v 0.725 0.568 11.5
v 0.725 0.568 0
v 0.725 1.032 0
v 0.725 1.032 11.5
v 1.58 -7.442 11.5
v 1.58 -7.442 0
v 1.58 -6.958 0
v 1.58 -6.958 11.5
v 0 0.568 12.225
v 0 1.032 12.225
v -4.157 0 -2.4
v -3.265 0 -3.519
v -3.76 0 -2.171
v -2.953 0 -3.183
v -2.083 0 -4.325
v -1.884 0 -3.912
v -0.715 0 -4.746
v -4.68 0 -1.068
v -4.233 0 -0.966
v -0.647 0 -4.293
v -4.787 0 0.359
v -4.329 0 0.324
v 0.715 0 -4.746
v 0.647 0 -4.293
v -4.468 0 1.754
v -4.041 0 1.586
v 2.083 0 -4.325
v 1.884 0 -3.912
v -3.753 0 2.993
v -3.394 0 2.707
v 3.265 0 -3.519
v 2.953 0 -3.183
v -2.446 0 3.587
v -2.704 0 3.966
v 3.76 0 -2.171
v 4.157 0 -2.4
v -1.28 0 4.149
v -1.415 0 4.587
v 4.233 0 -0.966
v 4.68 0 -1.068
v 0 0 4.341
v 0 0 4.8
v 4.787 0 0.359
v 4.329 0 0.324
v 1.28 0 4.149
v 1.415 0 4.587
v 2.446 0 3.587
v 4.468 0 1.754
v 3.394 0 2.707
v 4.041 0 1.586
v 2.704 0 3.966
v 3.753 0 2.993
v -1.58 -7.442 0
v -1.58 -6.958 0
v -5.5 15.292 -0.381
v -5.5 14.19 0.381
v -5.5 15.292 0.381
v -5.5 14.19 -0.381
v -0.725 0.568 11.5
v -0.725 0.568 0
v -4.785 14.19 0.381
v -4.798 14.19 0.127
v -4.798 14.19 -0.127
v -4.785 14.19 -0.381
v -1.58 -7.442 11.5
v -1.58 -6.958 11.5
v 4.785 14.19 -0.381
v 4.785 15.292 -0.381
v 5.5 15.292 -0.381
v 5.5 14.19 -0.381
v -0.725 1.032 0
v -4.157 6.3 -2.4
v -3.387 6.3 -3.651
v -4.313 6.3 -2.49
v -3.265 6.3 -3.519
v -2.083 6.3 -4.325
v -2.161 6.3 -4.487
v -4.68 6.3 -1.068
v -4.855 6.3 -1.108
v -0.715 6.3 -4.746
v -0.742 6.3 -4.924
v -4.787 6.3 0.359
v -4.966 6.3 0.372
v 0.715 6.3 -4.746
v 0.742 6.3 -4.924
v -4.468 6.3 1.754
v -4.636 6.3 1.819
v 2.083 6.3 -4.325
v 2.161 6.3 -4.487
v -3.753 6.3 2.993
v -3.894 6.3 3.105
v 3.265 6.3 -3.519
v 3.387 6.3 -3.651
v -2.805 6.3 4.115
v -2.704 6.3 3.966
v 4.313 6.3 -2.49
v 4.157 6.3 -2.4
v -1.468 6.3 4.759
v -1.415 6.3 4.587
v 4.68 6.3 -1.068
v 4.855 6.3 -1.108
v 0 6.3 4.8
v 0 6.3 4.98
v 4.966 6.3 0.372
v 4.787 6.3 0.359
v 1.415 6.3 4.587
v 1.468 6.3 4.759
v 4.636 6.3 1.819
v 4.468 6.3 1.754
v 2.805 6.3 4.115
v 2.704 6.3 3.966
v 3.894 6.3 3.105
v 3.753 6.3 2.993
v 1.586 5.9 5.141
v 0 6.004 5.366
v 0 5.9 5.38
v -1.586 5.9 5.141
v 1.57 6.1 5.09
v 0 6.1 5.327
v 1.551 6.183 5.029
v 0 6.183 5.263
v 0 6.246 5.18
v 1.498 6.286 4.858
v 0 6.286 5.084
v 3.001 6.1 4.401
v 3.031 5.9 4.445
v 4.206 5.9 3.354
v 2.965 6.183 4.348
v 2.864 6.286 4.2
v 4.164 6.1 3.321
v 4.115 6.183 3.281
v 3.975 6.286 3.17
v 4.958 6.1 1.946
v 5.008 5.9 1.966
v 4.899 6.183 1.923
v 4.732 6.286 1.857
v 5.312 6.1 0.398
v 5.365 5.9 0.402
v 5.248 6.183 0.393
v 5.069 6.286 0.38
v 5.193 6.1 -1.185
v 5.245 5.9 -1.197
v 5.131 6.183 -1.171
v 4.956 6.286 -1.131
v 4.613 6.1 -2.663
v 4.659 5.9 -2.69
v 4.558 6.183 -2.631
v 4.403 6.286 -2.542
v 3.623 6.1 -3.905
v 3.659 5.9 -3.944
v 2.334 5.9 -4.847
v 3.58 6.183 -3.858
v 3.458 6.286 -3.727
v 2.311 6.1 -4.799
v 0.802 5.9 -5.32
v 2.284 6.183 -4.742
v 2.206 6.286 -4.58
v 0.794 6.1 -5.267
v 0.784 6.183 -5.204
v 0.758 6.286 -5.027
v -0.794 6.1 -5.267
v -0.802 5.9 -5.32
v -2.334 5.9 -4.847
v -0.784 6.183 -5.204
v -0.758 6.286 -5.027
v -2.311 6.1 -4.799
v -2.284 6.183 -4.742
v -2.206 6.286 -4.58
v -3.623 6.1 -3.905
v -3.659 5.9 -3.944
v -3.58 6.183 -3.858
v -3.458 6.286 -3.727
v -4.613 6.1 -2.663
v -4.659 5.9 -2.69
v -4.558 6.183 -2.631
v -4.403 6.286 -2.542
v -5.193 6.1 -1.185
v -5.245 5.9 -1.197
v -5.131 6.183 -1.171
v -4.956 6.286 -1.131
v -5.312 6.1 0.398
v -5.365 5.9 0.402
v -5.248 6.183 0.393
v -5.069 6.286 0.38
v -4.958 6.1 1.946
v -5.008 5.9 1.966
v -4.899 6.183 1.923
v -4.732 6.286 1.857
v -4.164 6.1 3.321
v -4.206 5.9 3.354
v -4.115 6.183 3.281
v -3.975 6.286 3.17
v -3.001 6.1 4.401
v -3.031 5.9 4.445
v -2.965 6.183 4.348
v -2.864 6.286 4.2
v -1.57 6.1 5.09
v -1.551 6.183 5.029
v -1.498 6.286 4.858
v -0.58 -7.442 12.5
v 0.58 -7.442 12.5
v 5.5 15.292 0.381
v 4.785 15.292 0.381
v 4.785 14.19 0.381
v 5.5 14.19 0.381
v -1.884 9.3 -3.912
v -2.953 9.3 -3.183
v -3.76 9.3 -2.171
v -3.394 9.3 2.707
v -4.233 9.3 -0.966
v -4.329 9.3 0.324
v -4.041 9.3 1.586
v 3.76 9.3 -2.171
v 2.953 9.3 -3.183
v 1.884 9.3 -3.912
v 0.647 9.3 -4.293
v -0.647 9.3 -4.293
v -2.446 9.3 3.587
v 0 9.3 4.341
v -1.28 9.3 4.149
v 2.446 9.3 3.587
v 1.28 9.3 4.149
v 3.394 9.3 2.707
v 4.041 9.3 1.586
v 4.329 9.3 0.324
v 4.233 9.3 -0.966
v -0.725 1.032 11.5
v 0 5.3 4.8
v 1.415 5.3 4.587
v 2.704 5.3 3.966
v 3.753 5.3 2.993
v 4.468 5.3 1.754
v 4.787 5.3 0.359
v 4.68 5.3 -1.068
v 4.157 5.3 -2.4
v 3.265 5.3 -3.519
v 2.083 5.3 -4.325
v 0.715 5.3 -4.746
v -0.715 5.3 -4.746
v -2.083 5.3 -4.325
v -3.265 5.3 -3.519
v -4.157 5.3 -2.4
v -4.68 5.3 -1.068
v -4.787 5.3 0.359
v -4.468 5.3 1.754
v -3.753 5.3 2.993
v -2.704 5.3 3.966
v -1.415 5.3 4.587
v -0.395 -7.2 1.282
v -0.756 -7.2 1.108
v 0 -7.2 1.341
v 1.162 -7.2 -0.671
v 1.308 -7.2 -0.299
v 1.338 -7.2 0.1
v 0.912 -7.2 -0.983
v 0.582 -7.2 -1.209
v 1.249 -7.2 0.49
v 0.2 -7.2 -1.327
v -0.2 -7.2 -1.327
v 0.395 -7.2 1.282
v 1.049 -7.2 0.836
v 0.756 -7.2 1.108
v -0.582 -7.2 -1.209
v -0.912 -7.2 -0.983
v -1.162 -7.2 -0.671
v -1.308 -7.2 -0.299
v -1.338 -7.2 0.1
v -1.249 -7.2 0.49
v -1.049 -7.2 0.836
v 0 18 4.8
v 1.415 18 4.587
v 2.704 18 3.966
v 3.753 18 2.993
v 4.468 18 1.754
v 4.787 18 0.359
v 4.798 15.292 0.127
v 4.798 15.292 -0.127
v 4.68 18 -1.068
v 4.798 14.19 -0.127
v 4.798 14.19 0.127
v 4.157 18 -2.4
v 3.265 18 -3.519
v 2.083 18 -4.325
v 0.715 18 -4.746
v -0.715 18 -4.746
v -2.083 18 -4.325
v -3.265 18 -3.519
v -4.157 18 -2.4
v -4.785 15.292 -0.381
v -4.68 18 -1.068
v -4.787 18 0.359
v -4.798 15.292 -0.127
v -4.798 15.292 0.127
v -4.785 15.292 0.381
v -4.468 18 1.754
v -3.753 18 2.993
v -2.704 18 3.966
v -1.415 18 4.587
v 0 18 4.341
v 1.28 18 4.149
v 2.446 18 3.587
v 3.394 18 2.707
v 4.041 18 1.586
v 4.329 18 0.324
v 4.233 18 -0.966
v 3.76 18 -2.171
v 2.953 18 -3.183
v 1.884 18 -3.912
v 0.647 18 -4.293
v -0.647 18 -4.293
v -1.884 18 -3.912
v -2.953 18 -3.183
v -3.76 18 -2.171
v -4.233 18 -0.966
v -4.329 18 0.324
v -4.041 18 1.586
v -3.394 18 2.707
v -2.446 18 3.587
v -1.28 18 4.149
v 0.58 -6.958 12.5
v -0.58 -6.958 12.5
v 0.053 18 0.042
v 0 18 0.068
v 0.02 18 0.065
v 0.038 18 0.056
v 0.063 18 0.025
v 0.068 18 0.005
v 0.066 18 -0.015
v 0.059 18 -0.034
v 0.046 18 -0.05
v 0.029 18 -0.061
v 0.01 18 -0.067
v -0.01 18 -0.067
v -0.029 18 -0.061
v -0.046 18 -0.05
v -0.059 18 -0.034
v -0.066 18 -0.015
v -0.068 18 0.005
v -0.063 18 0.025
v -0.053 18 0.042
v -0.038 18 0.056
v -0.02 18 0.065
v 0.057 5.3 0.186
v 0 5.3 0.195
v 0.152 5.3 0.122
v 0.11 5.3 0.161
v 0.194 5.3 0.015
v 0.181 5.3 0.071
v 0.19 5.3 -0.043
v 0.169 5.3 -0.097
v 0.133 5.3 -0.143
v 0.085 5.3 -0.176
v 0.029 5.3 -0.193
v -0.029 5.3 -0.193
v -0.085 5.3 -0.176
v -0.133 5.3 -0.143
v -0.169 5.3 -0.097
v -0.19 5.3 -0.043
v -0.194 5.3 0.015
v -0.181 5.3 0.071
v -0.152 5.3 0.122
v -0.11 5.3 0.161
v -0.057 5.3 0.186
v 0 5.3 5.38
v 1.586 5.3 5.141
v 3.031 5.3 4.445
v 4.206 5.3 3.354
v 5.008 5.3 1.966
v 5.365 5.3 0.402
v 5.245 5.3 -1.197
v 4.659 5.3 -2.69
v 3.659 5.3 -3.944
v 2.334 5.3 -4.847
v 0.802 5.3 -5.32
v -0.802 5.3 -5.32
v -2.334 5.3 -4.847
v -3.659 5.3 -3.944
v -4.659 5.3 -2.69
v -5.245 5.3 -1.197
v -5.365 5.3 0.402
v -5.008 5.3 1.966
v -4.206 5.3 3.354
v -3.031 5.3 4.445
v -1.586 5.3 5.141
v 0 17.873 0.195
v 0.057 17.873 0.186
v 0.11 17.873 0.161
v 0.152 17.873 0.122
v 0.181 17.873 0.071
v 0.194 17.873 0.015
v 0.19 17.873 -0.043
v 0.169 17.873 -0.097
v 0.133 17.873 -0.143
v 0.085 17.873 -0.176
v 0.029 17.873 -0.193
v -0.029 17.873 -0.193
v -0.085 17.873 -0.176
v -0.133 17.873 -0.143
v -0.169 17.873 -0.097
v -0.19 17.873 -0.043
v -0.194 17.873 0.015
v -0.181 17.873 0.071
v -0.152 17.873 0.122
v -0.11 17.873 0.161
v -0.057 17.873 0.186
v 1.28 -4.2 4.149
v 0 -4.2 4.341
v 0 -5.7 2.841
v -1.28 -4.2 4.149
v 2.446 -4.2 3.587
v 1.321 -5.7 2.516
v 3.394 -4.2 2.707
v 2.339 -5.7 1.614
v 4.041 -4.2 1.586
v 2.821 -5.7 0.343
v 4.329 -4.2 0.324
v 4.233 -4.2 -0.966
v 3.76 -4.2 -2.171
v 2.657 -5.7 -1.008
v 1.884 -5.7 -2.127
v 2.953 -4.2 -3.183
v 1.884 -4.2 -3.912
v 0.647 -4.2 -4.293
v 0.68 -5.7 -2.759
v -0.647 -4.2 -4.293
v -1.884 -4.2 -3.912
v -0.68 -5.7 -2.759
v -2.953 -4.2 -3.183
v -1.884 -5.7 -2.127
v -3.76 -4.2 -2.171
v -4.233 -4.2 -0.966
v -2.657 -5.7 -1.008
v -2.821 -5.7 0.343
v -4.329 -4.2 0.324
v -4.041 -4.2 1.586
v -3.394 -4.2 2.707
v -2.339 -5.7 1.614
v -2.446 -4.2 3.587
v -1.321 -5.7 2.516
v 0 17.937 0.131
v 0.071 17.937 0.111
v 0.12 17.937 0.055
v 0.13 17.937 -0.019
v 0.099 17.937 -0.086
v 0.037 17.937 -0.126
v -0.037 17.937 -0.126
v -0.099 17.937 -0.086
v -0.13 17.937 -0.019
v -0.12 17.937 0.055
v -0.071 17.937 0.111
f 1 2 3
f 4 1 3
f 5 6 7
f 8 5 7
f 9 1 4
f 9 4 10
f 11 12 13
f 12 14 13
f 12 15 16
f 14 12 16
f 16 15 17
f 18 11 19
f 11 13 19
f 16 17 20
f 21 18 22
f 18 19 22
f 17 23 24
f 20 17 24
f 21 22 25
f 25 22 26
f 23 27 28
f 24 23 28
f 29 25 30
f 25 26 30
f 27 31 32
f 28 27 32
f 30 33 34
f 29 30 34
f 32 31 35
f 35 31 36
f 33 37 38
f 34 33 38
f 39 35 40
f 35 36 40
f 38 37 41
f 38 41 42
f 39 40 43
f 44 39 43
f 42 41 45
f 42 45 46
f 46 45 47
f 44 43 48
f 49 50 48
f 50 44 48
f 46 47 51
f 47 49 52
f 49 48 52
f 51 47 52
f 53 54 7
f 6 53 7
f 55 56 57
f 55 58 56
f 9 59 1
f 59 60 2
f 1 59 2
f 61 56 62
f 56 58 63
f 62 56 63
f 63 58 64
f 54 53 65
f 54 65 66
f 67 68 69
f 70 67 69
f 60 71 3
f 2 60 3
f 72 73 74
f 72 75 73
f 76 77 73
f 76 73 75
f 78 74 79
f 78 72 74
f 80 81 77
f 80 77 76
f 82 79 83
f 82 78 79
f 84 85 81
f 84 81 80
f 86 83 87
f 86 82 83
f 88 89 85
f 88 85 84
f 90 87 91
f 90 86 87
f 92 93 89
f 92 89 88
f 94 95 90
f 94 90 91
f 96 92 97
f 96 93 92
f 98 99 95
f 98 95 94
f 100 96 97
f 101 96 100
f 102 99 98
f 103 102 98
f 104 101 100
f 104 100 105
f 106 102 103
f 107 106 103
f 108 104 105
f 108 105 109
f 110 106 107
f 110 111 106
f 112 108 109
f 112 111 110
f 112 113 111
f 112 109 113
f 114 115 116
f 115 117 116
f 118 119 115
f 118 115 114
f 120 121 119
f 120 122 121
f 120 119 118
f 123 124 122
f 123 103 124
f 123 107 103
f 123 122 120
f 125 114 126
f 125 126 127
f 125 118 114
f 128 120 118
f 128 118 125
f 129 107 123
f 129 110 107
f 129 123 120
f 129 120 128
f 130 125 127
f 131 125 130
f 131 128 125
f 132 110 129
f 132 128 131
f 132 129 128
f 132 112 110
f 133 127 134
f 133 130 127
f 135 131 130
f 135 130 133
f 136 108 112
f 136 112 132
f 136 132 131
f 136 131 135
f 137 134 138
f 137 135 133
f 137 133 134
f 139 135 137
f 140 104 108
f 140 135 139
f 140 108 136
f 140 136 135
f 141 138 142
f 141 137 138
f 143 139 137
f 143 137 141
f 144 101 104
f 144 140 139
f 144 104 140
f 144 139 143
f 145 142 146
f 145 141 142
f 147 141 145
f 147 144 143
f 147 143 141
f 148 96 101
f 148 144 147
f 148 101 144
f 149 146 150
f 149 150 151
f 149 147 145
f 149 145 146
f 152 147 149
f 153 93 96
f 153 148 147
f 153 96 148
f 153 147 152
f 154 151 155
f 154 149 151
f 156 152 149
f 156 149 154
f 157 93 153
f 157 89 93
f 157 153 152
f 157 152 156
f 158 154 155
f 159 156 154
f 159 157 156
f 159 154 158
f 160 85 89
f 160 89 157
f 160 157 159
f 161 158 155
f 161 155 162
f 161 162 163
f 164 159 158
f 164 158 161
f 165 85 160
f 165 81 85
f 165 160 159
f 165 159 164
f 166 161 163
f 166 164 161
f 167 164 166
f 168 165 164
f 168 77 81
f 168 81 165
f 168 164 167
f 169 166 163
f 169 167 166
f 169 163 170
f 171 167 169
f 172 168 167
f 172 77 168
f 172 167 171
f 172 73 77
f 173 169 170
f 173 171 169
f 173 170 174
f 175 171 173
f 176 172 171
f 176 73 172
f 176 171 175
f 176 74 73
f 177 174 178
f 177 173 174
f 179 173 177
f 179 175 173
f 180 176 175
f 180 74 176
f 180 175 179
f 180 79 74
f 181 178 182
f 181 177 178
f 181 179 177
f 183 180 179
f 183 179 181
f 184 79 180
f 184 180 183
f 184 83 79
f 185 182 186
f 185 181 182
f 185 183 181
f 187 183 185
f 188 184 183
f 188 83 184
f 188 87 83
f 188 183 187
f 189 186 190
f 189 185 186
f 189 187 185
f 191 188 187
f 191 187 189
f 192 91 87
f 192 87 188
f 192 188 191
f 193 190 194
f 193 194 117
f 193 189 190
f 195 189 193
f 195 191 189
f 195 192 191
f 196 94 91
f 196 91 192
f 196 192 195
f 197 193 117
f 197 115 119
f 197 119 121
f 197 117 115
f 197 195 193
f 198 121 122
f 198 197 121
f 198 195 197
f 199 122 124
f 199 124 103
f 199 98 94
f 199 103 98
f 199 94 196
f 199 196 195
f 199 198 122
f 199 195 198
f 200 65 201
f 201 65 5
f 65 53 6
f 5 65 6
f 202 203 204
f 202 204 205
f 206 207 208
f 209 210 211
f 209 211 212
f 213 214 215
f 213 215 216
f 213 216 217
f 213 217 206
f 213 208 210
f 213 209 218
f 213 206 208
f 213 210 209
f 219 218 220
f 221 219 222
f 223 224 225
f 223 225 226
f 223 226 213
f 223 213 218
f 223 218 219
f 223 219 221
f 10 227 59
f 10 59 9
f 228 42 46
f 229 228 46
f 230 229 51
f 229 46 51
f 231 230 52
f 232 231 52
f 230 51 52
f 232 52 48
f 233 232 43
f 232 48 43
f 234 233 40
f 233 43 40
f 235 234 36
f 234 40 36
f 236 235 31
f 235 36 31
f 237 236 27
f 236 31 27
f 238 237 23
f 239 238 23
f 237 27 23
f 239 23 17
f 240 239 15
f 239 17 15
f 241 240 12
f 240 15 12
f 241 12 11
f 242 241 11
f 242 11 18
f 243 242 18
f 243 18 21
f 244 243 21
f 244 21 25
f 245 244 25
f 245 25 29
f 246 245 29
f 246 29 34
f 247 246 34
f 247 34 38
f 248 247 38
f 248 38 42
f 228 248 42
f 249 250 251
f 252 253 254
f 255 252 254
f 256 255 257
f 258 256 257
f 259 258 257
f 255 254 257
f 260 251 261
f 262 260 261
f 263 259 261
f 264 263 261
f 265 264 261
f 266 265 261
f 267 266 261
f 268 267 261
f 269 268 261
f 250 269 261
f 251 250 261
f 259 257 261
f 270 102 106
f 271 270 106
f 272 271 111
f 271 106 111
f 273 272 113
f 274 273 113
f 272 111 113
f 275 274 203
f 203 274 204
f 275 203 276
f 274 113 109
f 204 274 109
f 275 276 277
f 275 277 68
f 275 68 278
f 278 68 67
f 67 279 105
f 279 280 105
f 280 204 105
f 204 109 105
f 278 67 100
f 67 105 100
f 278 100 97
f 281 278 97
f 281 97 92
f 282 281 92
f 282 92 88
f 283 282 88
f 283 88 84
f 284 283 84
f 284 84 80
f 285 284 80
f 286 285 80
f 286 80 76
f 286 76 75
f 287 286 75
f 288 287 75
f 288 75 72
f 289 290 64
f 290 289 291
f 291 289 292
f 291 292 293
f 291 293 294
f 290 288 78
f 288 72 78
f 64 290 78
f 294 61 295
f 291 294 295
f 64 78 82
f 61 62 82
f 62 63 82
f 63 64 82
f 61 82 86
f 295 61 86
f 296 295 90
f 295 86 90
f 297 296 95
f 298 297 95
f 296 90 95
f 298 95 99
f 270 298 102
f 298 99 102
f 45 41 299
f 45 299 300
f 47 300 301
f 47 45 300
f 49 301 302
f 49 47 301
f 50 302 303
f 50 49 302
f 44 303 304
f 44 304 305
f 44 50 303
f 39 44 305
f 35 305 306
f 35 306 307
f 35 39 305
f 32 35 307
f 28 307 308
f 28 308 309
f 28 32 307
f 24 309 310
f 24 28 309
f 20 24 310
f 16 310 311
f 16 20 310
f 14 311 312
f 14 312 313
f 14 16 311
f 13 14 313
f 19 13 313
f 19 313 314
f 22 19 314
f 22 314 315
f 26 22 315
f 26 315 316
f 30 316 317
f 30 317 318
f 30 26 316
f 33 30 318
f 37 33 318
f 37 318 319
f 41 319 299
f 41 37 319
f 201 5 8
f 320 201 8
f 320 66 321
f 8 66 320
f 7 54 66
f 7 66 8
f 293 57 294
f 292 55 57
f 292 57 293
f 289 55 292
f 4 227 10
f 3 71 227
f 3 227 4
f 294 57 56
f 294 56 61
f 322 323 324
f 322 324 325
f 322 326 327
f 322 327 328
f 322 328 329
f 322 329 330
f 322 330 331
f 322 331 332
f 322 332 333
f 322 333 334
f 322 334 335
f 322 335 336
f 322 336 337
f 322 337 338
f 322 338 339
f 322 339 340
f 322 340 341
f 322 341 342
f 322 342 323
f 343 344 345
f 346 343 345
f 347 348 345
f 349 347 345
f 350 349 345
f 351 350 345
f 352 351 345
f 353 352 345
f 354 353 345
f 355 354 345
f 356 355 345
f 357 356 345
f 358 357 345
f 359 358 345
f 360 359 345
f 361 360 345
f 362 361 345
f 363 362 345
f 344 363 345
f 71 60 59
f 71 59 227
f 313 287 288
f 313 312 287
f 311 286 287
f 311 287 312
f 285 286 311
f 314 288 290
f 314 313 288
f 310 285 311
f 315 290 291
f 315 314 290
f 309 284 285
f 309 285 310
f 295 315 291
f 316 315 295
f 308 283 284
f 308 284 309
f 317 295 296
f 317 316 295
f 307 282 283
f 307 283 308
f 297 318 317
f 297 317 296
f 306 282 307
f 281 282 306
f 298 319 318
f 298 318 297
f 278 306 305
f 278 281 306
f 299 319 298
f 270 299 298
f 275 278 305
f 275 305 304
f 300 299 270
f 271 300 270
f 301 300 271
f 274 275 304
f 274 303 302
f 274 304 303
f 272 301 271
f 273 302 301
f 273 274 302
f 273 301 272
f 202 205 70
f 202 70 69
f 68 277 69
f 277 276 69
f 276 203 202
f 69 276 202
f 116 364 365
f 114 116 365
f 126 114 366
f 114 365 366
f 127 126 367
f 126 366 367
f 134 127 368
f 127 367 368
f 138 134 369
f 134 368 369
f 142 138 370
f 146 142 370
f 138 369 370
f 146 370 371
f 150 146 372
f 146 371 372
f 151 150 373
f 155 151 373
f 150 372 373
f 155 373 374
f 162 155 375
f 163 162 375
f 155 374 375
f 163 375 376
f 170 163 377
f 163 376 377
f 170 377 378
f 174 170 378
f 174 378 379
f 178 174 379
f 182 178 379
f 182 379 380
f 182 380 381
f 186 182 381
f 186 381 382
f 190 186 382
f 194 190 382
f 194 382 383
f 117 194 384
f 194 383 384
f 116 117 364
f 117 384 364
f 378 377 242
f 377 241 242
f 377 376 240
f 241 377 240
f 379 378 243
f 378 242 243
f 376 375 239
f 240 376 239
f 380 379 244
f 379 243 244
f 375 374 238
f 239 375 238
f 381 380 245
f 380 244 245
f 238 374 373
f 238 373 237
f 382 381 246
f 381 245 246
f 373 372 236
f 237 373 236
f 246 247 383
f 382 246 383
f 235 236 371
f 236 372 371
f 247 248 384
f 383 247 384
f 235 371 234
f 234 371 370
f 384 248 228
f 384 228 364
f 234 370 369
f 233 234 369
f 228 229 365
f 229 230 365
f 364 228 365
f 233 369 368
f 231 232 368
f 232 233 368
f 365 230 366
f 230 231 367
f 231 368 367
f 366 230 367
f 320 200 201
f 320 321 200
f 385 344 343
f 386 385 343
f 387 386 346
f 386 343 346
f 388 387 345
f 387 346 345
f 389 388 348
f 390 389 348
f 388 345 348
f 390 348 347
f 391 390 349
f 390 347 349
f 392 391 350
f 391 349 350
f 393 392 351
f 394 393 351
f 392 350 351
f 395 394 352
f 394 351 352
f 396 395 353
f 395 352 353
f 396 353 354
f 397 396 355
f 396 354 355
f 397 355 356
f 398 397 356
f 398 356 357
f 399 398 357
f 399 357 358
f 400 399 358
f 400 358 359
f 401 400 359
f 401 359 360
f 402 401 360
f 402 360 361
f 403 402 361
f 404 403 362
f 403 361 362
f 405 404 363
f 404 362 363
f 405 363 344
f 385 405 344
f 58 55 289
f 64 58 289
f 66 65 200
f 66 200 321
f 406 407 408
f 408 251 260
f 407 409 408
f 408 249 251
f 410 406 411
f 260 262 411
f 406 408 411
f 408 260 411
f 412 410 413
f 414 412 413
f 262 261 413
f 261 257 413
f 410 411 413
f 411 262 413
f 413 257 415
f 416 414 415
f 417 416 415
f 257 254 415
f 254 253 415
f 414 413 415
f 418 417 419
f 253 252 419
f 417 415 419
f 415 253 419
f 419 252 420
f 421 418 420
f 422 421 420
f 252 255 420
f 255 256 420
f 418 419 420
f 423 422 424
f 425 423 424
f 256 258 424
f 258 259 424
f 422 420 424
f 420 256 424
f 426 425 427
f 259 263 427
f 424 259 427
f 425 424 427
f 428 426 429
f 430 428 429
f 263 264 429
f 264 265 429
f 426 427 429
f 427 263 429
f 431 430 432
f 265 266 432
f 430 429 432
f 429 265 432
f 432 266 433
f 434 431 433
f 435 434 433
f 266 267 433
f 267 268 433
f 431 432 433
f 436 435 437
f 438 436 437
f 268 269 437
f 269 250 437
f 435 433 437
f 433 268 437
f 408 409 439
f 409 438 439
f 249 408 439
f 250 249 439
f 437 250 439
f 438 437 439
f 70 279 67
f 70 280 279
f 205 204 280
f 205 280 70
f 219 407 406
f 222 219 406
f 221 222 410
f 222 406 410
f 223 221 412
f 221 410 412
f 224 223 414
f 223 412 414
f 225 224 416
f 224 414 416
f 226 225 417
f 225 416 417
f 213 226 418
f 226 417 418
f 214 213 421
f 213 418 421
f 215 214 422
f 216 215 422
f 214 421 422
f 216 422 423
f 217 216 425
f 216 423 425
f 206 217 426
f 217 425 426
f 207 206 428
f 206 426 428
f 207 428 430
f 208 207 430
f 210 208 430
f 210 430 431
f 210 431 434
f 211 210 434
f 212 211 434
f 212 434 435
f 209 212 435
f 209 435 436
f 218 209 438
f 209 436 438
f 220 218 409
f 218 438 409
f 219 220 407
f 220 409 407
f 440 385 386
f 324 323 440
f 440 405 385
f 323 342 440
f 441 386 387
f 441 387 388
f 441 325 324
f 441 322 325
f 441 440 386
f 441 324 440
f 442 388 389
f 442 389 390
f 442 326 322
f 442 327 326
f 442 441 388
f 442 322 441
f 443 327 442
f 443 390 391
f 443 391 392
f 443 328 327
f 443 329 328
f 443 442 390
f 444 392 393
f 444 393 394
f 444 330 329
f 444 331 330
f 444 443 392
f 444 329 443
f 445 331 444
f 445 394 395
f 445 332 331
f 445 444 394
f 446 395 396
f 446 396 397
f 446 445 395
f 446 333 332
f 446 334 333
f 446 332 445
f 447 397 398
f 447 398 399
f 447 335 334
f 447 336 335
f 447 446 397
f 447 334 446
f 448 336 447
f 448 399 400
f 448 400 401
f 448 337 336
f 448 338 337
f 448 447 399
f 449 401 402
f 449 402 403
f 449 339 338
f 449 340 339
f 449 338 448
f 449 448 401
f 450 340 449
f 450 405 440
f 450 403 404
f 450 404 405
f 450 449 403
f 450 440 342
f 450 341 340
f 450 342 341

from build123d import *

# Parameters (mm, degrees)
SKETCH1_R                = 4.8
SKETCH1_R_2              = 4.341497015
BOSS_EXTRUDE1_DEPTH      = 18
SKETCH2_R                = 5.380109722
SKETCH2_R_2              = 4.8
BOSS_EXTRUDE2_DEPTH      = 1
FILLET1_R                = 0.4
SKETCH3_W                = 0.886095775
SKETCH3_H                = 1.101271723
BOSS_EXTRUDE3_DEPTH      = 0.381
SKETCH4_R                = 0.194934423
BOSS_EXTRUDE4_DEPTH      = 12.7
CHAMFER1_SIZE            = 0.127
SKETCH6_W                = 1.45
SKETCH6_H                = 0.463784272
BOSS_EXTRUDE5_DEPTH      = 12.5
SKETCH6_W_2              = 3.16
SKETCH6_H_2              = 0.48490007
BOSS_EXTRUDE5_2_DEPTH    = 12.5
CHAMFER2_SIZE            = 1
CHAMFER3_SIZE            = 1
BOSS_EXTRUDE6_DEPTH      = 4
BOSS_EXTRUDE6_DEPTH_BACK = 12.5
SKETCH7_R                = 4.341497015
CHAMFER4_SIZE            = 3


with BuildPart() as part:
    # Sketch1 → Boss-Extrude1 (new body)
    with BuildSketch(Plane(origin=(0, 0, 0), x_dir=(1, 0, 0), z_dir=(0, 1, 0))):
        with Locations(Location((0, 0, 0), (0, 0, 270))):
            Circle(SKETCH1_R)
        with Locations(Location((0, 0, 0), (0, 0, 270))):
            Circle(SKETCH1_R_2, mode=Mode.SUBTRACT)
    extrude(amount=BOSS_EXTRUDE1_DEPTH)

    # Sketch2 → Boss-Extrude2 (add)
    with BuildSketch(Plane(origin=(0, 5.3, 0), x_dir=(1, 0, 0), z_dir=(0, 1, 0))):
        with Locations(Location((0, 0, 0), (0, 0, 270))):
            Circle(SKETCH2_R)
        with Locations(Location((0, 0, 0), (0, 0, 270))):
            Circle(SKETCH2_R_2, mode=Mode.SUBTRACT)
    extrude(amount=BOSS_EXTRUDE2_DEPTH)

    # Fillet1
    fillet1_edges = [part.edges().sort_by_distance(p)[0] for p in [
        (0, 6.3, -5.380109722),
    ]]
    fillet(fillet1_edges, radius=FILLET1_R)

    # Sketch3 → Boss-Extrude3 (add, symmetric)
    with BuildSketch(Plane.XY):
        with Locations((-5.056952113, 14.74105587)):
            Rectangle(SKETCH3_W, SKETCH3_H)
        with Locations((5.056952113, 14.74105587)):
            Rectangle(SKETCH3_W, SKETCH3_H)
    extrude(amount=BOSS_EXTRUDE3_DEPTH, both=True)


with BuildPart() as body_2:
    # Sketch4 → Boss-Extrude4 (new body)
    with BuildSketch(Plane(origin=(0, 5.3, 0), x_dir=(1, 0, 0), z_dir=(0, 1, 0))):
        with Locations(Location((0, 0, 0), (0, 0, 270))):
            Circle(SKETCH4_R)
    extrude(amount=BOSS_EXTRUDE4_DEPTH)

    # Chamfer1
    chamfer1_edges = [body_2.edges().sort_by_distance(p)[0] for p in [
        (0, 18, -0.194934423),
    ]]
    chamfer(chamfer1_edges, length=CHAMFER1_SIZE)


with BuildPart() as body_3:
    # Sketch6 → Boss-Extrude5 (new body)
    with BuildSketch(Plane.XY):
        with Locations((0, 0.8)):
            Rectangle(SKETCH6_W, SKETCH6_H)
    extrude(amount=BOSS_EXTRUDE5_DEPTH)

    # Chamfer2
    # the kernel refuses this chamfer: 1 mm, written as the material it takes off along each edge
    with BuildSketch(Plane(origin=(-0.725, 3.603575124, 12.5), x_dir=(-0.027495876610586403, 0, -0.9996219169112968), z_dir=(0, -1, 0)), Plane(origin=(0.725, -2.003575124, 12.5), x_dir=(0.027495876610586403, 0, -0.9996219169112968), z_dir=(0, 1, 0))) as chamfer2_piece_1:
        Polygon((CHAMFER2_SIZE * 0.999621916911, CHAMFER2_SIZE * 0.0274958766106), (-CHAMFER2_SIZE * 0.0274958766106, CHAMFER2_SIZE * 0.999621916911), (0, 0), align=None)
    extrude(amount=5.607150248, mode=Mode.SUBTRACT)


with BuildPart() as body_4:
    # Sketch6 → Boss-Extrude5 2 (new body)
    with BuildSketch(Plane.XY):
        with Locations((0, -7.2)):
            Rectangle(SKETCH6_W_2, SKETCH6_H_2)
    extrude(amount=BOSS_EXTRUDE5_2_DEPTH)

    # Chamfer3
    chamfer3_edges = [body_4.edges().sort_by_distance(p)[0] for p in [
        (-1.58, -7.2, 12.5),
        (1.58, -7.2, 12.5),
    ]]
    chamfer(chamfer3_edges, length=CHAMFER3_SIZE)


with BuildPart() as body_5:
    # Sketch7 → Boss-Extrude6 (new, two sides: drawn at the far end of the back side and taken through both)
    with BuildSketch(Plane(origin=(0, 5.3, 0), x_dir=(1, 0, 0), z_dir=(0, 1, 0)).offset(-BOSS_EXTRUDE6_DEPTH_BACK)):
        with Locations(Location((0, 0, 0), (0, 0, 270))):
            Circle(SKETCH7_R)
    extrude(amount=BOSS_EXTRUDE6_DEPTH + BOSS_EXTRUDE6_DEPTH_BACK)

    # Chamfer4
    chamfer4_edges = [body_5.edges().sort_by_distance(p)[0] for p in [
        (0, -7.2, -4.341497015),
    ]]
    chamfer(chamfer4_edges, length=CHAMFER4_SIZE)


solid = Compound([part.part, body_2.part, body_3.part, body_4.part, body_5.part])
